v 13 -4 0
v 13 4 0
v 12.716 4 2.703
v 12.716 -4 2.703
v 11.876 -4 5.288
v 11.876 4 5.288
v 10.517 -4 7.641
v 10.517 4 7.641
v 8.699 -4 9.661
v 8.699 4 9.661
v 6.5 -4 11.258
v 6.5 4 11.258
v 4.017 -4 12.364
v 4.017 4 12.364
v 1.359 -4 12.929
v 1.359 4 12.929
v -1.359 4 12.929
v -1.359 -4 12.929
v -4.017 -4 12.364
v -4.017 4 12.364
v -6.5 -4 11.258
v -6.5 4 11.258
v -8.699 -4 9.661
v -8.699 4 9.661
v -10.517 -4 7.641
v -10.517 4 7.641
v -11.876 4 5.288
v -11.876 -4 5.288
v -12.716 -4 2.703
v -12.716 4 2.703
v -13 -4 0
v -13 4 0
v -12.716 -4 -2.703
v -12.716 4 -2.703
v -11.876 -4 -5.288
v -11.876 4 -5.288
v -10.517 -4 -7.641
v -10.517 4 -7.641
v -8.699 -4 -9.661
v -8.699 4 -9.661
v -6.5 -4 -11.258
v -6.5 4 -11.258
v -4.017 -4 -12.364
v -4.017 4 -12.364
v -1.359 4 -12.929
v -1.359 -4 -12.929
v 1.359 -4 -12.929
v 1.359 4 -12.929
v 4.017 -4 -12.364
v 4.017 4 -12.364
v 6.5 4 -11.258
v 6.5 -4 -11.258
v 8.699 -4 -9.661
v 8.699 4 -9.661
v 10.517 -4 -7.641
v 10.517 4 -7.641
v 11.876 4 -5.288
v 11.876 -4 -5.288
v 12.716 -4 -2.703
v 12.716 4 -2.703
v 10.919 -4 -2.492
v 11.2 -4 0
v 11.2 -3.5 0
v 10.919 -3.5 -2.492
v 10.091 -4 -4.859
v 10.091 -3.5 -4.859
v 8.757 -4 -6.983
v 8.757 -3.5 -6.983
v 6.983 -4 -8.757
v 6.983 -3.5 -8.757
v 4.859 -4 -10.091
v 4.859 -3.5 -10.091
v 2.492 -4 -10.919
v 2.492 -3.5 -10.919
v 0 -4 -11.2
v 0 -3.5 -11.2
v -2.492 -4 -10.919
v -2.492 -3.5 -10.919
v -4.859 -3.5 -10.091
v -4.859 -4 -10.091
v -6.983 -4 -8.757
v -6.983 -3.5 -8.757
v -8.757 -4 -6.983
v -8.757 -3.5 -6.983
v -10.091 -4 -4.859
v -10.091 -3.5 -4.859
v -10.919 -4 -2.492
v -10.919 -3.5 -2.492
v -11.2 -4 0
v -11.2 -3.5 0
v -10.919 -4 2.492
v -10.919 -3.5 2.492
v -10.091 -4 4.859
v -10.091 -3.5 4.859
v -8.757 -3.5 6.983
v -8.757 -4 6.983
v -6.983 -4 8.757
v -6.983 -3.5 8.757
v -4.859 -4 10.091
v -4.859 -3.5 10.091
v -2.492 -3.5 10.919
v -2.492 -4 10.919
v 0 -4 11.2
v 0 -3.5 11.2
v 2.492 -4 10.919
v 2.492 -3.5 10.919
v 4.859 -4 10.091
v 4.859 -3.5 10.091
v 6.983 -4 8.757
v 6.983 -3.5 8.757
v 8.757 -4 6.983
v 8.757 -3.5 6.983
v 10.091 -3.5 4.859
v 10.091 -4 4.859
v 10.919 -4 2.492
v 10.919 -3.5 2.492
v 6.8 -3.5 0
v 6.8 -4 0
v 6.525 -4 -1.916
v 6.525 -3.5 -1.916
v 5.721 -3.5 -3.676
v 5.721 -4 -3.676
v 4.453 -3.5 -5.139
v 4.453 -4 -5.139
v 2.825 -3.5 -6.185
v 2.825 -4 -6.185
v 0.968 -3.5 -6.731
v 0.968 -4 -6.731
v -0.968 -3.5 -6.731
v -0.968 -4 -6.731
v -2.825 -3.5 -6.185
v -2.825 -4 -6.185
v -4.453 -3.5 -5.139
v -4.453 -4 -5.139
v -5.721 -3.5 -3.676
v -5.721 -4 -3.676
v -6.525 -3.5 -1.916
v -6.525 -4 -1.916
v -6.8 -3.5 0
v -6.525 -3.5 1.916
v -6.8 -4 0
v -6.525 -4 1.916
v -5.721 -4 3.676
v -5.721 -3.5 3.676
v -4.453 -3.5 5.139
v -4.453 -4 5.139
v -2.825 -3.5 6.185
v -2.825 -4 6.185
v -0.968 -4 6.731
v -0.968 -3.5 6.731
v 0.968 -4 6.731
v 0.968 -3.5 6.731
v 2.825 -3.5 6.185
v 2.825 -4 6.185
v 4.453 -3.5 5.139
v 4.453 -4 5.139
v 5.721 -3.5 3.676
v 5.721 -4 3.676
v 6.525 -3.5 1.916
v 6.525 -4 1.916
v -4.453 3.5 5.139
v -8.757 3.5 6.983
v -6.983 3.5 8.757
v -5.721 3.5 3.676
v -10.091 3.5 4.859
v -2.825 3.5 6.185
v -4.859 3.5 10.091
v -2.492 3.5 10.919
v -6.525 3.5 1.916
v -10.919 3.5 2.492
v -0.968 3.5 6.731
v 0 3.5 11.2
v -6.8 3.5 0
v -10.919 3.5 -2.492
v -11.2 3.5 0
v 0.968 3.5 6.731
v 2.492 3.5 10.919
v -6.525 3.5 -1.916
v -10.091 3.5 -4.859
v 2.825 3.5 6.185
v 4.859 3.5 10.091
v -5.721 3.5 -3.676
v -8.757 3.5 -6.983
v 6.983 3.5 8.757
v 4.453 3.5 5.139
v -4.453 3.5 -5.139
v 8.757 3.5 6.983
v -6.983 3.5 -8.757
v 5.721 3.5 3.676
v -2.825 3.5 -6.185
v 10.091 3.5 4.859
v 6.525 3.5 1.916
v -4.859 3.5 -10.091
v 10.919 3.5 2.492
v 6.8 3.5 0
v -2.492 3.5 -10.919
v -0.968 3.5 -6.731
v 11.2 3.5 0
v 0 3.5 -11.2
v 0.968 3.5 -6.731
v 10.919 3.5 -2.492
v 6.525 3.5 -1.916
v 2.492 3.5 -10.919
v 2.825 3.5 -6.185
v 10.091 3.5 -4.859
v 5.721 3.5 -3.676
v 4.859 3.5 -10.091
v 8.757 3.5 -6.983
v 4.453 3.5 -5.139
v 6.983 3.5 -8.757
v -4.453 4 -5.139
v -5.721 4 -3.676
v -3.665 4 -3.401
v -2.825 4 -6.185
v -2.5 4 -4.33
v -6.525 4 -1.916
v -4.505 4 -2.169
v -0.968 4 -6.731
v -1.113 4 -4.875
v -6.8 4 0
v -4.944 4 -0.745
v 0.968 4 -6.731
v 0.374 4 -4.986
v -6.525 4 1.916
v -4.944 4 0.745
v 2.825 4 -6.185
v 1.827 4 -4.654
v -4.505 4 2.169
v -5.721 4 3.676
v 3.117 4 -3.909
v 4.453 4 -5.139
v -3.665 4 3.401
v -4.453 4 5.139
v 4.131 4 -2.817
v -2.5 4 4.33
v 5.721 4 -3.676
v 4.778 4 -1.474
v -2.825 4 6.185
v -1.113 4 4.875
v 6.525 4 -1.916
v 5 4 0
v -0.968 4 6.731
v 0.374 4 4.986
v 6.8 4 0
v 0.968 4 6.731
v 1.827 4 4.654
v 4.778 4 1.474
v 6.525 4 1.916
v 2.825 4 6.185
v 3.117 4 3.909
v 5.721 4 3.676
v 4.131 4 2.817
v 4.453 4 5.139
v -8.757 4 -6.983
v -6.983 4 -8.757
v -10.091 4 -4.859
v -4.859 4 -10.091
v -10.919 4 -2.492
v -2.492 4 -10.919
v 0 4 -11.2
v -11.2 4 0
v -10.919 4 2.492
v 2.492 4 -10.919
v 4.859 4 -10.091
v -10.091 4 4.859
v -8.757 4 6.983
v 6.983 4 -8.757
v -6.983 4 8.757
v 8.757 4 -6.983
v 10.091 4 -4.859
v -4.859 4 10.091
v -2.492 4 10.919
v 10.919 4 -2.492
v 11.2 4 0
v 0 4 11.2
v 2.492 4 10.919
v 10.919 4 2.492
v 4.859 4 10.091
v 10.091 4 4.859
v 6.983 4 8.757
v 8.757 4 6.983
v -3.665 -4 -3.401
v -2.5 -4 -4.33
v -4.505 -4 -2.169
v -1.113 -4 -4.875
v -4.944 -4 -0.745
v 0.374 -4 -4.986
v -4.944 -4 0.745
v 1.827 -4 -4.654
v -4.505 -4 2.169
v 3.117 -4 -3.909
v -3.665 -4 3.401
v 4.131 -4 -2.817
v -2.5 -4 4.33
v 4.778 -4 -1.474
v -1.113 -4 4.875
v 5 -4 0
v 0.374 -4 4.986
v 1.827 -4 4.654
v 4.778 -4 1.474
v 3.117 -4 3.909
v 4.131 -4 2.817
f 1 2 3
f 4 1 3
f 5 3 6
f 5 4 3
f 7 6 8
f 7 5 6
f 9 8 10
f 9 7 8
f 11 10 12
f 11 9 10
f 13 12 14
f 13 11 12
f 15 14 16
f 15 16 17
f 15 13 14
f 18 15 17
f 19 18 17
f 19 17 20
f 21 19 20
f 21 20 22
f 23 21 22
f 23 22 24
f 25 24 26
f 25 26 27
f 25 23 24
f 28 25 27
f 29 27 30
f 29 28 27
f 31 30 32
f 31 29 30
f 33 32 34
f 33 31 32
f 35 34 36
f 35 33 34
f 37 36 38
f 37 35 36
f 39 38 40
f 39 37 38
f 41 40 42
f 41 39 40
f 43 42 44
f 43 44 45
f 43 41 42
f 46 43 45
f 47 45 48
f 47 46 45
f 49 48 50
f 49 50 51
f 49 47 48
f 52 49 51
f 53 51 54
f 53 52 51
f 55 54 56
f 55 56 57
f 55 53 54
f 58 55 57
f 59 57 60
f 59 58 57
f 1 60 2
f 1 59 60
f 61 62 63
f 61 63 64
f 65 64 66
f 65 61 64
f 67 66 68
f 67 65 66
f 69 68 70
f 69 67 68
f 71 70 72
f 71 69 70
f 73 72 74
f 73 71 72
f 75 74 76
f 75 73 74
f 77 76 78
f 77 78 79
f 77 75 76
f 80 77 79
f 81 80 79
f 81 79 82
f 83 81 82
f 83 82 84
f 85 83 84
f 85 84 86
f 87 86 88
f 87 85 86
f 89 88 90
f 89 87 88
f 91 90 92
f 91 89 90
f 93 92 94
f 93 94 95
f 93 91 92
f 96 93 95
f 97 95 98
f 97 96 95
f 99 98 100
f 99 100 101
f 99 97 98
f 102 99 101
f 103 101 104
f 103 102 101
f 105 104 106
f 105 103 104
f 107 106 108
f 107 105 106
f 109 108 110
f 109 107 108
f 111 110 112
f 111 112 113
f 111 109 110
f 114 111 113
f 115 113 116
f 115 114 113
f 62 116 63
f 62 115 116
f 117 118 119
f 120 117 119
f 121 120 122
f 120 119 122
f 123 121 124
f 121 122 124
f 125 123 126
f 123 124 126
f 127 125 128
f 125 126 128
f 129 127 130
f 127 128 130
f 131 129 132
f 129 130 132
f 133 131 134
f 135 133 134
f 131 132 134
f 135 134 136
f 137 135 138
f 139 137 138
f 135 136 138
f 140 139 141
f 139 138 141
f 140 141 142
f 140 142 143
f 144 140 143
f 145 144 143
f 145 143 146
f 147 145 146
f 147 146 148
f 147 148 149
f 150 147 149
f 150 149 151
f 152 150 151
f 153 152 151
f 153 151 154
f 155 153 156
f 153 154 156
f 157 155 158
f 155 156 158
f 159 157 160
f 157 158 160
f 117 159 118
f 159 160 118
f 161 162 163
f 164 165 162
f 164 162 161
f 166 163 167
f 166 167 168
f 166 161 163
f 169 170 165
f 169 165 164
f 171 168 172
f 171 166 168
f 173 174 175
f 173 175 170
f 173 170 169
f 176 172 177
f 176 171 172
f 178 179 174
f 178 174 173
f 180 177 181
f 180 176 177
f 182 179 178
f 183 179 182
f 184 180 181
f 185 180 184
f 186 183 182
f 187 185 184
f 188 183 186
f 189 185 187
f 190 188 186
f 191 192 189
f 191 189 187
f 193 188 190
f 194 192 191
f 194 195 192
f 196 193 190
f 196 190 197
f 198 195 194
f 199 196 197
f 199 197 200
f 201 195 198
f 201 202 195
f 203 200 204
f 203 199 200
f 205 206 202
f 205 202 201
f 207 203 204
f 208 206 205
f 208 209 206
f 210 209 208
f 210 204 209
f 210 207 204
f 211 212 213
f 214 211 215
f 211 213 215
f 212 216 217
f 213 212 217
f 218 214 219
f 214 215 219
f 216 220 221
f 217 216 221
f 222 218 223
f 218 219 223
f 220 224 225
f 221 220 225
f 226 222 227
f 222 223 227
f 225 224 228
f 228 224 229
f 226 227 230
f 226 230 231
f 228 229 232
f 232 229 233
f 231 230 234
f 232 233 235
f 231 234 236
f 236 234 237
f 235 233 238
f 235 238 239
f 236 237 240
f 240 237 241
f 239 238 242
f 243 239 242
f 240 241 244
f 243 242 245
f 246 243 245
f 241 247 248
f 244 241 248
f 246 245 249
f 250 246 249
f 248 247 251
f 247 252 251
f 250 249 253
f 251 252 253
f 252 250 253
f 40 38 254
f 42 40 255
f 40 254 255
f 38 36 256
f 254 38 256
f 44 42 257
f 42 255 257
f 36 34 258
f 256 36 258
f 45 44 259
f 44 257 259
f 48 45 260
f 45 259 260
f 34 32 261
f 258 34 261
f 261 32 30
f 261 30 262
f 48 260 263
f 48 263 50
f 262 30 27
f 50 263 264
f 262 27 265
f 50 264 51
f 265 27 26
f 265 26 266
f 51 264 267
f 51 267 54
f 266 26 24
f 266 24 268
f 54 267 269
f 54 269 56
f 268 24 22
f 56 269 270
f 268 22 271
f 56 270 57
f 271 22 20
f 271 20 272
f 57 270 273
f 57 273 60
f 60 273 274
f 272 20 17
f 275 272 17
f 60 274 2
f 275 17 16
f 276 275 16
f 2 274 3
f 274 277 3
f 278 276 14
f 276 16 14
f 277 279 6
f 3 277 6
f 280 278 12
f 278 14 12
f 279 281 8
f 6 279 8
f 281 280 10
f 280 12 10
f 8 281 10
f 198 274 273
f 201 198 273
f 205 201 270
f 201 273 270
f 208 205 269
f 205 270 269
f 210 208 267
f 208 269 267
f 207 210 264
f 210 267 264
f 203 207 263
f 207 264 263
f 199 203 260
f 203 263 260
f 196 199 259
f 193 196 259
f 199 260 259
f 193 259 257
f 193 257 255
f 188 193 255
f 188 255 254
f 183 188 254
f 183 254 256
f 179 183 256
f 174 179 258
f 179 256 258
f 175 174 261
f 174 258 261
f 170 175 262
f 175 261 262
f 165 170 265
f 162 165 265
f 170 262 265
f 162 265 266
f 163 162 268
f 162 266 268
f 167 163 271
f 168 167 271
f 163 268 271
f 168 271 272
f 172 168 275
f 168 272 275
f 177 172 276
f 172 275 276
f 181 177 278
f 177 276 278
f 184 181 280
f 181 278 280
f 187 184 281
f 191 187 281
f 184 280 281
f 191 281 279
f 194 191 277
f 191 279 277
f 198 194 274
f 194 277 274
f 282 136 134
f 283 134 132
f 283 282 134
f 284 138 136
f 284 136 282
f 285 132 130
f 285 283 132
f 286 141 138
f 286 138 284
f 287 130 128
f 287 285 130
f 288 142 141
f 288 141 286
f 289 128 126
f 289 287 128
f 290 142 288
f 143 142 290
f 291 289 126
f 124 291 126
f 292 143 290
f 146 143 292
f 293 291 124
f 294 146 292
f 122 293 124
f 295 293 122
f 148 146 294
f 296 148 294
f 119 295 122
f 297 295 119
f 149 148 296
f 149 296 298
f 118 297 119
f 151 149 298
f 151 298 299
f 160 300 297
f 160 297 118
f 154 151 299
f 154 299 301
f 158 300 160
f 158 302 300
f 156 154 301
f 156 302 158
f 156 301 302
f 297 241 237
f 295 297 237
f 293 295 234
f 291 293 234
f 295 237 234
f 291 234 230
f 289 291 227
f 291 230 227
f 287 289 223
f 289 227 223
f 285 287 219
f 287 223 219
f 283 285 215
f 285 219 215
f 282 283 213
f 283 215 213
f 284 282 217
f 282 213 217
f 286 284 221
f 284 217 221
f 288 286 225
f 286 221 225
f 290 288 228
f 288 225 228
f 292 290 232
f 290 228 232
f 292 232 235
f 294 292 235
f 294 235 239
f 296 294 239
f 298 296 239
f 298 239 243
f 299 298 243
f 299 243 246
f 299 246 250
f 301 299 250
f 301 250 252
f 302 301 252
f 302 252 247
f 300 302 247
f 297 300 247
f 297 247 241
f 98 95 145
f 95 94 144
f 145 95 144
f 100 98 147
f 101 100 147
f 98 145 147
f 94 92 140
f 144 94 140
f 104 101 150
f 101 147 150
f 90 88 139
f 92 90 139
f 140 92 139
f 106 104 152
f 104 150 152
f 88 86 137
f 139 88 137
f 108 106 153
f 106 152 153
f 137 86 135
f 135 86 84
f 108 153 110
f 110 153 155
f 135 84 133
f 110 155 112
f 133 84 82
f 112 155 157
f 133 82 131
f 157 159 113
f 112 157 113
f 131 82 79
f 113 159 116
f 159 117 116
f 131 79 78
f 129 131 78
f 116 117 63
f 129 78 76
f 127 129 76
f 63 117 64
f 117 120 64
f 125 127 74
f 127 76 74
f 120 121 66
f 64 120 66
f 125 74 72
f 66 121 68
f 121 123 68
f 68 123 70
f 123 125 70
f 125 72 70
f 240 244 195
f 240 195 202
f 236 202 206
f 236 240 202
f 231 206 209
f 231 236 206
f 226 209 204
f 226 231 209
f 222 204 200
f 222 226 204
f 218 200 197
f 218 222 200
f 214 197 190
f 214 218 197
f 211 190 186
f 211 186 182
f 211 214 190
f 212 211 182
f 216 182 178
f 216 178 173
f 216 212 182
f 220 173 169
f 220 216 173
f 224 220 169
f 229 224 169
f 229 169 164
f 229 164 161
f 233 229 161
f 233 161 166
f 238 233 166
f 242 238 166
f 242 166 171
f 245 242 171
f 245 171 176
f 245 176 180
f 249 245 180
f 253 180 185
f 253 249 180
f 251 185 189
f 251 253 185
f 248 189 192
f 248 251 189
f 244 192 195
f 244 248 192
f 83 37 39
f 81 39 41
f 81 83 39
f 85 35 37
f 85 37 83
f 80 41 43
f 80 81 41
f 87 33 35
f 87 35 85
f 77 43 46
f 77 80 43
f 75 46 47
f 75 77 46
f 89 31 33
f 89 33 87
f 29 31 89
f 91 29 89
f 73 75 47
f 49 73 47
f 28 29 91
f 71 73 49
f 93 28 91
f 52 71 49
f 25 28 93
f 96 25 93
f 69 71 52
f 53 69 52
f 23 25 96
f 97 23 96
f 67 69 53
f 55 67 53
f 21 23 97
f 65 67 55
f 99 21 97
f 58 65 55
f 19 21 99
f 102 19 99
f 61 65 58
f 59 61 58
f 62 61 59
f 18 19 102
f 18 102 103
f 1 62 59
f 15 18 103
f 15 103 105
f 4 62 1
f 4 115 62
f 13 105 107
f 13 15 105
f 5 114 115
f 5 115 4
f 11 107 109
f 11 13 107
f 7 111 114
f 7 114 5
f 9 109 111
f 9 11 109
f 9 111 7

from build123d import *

# Parameters (mm, degrees)
SKETCH_R        = 13
PAD_DEPTH       = 4
SKETCH001_R     = 11.2
SKETCH001_R_2   = 6.8
POCKET_DEPTH    = 0.5
SKETCH002_R     = 5
POCKET001_DEPTH = 8.001


with BuildPart() as part:
    # Sketch → Pad (new body, symmetric)
    with BuildSketch(Plane.XZ):
        Circle(SKETCH_R)
    extrude(amount=PAD_DEPTH, both=True)

    # Sketch001 (on Face2 of Pad) → Pocket (cut)
    with BuildSketch(Plane(origin=(0, 4, 0), x_dir=(1, 0, 0), z_dir=(0, 1, 0))):
        Circle(SKETCH001_R)
        Circle(SKETCH001_R_2, mode=Mode.SUBTRACT)
    pocket = extrude(amount=-POCKET_DEPTH, mode=Mode.SUBTRACT)

    # Mirrored: Pocket across XZ
    add(pocket.mirror(Plane.XZ), mode=Mode.SUBTRACT)

    # Sketch002 (on Face10 of Mirrored) → Pocket001 (cut, through all)
    with BuildSketch(Plane(origin=(0, 4, 0), x_dir=(1, 0, 0), z_dir=(0, 1, 0))):
        Circle(SKETCH002_R)
    extrude(amount=-POCKET001_DEPTH, mode=Mode.SUBTRACT)


solid = part.part
